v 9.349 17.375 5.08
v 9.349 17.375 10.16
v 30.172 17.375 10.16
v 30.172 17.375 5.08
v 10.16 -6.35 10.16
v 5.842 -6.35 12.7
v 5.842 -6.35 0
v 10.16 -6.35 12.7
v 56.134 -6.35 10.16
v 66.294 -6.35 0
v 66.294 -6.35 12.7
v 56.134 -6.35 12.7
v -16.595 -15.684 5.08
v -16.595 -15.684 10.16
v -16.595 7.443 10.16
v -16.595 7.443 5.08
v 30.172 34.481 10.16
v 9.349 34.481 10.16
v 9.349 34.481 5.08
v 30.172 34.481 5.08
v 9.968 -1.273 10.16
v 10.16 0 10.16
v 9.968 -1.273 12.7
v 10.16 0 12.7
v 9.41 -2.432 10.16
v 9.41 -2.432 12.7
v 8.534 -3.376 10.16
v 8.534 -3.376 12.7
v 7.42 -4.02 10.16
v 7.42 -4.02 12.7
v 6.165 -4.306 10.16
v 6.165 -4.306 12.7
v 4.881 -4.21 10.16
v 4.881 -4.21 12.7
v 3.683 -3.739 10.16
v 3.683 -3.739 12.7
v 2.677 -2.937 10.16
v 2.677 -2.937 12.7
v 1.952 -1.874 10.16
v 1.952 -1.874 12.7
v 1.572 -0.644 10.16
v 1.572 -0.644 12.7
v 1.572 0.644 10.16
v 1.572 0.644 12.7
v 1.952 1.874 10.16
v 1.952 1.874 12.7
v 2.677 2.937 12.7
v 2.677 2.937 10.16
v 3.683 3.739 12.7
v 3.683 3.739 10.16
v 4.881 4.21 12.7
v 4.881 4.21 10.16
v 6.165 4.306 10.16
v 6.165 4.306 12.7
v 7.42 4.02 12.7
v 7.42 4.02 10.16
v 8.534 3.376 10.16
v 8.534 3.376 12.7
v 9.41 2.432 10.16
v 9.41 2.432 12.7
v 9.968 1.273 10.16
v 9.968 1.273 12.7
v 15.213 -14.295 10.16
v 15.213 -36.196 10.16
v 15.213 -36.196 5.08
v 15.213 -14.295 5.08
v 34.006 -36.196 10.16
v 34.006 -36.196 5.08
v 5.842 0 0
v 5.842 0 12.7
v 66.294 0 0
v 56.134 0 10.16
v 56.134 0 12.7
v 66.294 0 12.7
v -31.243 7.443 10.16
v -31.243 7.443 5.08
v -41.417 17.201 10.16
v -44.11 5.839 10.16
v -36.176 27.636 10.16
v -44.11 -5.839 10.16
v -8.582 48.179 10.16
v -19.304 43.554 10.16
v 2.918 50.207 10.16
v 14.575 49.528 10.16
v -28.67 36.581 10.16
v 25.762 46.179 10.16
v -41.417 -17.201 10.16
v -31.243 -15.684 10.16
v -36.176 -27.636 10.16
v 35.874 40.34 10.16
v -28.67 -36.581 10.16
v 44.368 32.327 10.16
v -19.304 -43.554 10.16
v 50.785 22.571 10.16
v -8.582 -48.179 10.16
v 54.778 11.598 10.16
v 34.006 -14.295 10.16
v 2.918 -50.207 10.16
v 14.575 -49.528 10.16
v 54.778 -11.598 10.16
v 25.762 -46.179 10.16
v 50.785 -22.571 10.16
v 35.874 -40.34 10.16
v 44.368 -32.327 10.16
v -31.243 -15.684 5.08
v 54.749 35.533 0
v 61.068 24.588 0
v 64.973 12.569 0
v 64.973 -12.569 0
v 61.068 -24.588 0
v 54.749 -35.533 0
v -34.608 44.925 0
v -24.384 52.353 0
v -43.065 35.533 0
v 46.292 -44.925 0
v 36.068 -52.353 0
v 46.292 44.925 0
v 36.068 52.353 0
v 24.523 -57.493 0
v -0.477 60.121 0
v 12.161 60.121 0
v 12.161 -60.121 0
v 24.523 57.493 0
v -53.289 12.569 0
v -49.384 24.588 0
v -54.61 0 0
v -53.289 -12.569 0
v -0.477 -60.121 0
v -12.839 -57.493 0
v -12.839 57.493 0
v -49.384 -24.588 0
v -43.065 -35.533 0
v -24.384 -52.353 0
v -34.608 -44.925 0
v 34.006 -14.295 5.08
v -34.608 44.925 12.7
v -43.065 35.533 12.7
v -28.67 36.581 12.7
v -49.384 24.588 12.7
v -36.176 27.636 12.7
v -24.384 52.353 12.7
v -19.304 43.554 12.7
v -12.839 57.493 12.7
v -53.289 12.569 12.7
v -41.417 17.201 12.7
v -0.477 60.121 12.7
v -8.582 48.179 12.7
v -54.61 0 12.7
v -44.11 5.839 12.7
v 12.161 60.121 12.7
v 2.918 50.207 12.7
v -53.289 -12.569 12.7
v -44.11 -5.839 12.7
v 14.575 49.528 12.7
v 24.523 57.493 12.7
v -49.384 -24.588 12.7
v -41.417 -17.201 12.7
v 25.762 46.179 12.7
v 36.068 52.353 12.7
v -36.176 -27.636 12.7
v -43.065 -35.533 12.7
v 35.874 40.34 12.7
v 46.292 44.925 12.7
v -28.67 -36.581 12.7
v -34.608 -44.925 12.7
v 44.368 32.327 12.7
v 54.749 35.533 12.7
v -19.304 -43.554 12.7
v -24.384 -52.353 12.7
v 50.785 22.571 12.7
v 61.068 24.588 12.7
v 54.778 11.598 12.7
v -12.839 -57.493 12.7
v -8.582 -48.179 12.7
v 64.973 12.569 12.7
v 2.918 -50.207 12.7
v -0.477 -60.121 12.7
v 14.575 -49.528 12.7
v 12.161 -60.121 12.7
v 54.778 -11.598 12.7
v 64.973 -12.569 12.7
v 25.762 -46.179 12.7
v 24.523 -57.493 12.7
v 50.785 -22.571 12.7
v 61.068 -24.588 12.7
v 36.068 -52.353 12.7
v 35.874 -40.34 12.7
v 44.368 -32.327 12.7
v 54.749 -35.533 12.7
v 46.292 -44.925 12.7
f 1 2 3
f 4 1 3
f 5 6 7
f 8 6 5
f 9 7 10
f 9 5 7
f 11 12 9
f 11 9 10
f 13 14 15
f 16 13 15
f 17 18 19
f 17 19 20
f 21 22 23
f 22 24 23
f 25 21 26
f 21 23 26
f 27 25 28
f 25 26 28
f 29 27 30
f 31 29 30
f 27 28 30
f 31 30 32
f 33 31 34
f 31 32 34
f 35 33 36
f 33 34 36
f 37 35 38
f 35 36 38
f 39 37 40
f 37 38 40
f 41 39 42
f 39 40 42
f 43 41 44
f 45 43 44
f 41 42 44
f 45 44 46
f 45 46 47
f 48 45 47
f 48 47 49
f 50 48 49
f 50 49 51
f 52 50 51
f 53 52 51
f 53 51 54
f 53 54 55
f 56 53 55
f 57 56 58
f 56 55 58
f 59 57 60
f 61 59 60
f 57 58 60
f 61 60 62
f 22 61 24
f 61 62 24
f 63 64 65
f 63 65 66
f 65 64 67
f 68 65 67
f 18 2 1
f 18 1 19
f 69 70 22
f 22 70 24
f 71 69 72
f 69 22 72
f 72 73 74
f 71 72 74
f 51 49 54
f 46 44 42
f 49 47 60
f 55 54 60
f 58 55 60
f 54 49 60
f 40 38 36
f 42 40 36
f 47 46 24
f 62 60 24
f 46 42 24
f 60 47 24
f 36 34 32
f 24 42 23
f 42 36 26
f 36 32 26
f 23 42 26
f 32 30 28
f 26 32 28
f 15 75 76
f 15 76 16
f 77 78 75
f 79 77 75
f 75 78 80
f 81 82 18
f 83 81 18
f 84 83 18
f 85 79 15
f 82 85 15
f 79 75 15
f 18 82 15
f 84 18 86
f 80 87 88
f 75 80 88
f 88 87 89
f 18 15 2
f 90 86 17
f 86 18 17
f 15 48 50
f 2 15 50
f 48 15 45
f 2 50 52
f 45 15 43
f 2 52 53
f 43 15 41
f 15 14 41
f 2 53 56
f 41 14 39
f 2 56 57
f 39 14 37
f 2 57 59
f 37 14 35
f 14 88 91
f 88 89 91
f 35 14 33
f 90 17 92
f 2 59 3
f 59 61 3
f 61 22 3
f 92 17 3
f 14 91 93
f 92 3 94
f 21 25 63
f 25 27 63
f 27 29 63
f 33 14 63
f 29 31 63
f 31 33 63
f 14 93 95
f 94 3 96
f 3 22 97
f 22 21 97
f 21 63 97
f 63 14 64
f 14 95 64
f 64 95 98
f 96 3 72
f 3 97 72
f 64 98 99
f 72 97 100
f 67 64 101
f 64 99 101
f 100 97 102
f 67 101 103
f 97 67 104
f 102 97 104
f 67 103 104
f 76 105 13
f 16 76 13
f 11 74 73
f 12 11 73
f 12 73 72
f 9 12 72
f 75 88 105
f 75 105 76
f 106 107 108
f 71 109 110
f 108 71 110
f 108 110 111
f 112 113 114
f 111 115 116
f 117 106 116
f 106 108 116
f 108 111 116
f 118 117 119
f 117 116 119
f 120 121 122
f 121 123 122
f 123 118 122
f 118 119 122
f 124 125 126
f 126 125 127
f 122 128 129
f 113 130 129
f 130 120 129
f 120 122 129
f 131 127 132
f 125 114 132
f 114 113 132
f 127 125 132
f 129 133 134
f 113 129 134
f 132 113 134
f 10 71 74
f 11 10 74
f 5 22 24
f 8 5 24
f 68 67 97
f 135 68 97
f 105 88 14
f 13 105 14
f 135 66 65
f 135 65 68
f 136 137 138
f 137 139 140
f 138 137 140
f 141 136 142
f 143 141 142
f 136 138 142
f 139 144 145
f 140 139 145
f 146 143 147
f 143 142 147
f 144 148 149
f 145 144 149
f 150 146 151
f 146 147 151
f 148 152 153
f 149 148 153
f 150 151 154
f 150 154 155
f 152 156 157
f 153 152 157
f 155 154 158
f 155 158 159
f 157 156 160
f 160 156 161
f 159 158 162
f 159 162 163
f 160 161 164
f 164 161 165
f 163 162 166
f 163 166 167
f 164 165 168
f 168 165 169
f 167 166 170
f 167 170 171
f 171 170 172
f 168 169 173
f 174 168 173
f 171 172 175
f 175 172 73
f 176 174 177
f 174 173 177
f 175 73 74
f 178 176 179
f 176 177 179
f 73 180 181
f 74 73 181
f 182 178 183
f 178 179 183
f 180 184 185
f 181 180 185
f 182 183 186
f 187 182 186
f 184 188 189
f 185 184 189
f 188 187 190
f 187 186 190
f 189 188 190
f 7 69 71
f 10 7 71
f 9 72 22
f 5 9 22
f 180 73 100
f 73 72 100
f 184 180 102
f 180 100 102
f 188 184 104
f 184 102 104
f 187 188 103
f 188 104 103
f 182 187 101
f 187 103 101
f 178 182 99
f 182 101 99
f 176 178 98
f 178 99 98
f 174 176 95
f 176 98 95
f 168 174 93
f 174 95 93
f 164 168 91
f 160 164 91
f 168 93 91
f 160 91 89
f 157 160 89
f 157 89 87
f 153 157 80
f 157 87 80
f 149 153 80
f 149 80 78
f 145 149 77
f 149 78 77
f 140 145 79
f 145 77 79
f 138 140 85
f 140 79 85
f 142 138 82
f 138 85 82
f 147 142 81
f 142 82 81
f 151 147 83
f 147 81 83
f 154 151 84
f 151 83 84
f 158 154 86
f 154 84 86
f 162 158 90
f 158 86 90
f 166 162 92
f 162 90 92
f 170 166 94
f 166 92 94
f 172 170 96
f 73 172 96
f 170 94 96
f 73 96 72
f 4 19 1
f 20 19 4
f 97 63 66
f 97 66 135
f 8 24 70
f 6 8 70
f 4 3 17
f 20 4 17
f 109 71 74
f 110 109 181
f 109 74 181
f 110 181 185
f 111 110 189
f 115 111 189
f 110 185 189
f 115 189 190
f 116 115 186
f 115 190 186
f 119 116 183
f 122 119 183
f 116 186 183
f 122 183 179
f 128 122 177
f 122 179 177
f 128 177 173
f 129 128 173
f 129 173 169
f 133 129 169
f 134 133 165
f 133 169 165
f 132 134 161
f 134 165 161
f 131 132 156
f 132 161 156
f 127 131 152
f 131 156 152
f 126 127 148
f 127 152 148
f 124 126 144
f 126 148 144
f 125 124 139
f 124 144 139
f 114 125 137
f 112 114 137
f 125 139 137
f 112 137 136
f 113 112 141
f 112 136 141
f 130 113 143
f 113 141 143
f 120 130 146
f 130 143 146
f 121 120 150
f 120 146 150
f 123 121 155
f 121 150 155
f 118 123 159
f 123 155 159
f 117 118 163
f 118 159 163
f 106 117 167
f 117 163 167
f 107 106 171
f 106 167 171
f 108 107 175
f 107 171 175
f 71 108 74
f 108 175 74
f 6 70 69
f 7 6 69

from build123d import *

# Parameters (mm, degrees)
F2_DEPTH = 6.35
F3_W     = 18.792614
F3_H     = 21.901235
F3_W_2   = 14.647723
F3_H_2   = 23.127168
F3_W_3   = 20.822802
F3_H_3   = 17.105863
F4_DEPTH = 5.08


with BuildPart() as f1:
    # F0 (on Front) → F1 (revolve)
    with BuildSketch(Plane.XZ):
        Polygon((5.842, 12.7), (5.842, 0), (66.294, 0), (66.294, 12.7), (56.134, 12.7), (56.134, 10.16), (10.16, 10.16), (10.16, 12.7), align=None)
    revolve(axis=Axis((5.842, 0, 2.921), (0, 0, -1)))

    # F3 (on face) → F4 (cut)
    with BuildSketch(Plane.XY.offset(10.16)):
        with Locations((24.609473, -25.245189)):
            Rectangle(F3_W, F3_H)
        with Locations((-23.918686, -4.120691)):
            Rectangle(F3_W_2, F3_H_2)
        with Locations((19.760761, 25.92767)):
            Rectangle(F3_W_3, F3_H_3)
    extrude(amount=-F4_DEPTH, mode=Mode.SUBTRACT)


with BuildPart() as f2:
    # F0 (on Front) → F2 (new body)
    with BuildSketch(Plane.XZ):
        Polygon((5.842, 12.7), (5.842, 0), (66.294, 0), (66.294, 12.7), (56.134, 12.7), (56.134, 10.16), (10.16, 10.16), (10.16, 12.7), align=None)
    extrude(amount=F2_DEPTH)


solid = Compound([f1.part, f2.part])
